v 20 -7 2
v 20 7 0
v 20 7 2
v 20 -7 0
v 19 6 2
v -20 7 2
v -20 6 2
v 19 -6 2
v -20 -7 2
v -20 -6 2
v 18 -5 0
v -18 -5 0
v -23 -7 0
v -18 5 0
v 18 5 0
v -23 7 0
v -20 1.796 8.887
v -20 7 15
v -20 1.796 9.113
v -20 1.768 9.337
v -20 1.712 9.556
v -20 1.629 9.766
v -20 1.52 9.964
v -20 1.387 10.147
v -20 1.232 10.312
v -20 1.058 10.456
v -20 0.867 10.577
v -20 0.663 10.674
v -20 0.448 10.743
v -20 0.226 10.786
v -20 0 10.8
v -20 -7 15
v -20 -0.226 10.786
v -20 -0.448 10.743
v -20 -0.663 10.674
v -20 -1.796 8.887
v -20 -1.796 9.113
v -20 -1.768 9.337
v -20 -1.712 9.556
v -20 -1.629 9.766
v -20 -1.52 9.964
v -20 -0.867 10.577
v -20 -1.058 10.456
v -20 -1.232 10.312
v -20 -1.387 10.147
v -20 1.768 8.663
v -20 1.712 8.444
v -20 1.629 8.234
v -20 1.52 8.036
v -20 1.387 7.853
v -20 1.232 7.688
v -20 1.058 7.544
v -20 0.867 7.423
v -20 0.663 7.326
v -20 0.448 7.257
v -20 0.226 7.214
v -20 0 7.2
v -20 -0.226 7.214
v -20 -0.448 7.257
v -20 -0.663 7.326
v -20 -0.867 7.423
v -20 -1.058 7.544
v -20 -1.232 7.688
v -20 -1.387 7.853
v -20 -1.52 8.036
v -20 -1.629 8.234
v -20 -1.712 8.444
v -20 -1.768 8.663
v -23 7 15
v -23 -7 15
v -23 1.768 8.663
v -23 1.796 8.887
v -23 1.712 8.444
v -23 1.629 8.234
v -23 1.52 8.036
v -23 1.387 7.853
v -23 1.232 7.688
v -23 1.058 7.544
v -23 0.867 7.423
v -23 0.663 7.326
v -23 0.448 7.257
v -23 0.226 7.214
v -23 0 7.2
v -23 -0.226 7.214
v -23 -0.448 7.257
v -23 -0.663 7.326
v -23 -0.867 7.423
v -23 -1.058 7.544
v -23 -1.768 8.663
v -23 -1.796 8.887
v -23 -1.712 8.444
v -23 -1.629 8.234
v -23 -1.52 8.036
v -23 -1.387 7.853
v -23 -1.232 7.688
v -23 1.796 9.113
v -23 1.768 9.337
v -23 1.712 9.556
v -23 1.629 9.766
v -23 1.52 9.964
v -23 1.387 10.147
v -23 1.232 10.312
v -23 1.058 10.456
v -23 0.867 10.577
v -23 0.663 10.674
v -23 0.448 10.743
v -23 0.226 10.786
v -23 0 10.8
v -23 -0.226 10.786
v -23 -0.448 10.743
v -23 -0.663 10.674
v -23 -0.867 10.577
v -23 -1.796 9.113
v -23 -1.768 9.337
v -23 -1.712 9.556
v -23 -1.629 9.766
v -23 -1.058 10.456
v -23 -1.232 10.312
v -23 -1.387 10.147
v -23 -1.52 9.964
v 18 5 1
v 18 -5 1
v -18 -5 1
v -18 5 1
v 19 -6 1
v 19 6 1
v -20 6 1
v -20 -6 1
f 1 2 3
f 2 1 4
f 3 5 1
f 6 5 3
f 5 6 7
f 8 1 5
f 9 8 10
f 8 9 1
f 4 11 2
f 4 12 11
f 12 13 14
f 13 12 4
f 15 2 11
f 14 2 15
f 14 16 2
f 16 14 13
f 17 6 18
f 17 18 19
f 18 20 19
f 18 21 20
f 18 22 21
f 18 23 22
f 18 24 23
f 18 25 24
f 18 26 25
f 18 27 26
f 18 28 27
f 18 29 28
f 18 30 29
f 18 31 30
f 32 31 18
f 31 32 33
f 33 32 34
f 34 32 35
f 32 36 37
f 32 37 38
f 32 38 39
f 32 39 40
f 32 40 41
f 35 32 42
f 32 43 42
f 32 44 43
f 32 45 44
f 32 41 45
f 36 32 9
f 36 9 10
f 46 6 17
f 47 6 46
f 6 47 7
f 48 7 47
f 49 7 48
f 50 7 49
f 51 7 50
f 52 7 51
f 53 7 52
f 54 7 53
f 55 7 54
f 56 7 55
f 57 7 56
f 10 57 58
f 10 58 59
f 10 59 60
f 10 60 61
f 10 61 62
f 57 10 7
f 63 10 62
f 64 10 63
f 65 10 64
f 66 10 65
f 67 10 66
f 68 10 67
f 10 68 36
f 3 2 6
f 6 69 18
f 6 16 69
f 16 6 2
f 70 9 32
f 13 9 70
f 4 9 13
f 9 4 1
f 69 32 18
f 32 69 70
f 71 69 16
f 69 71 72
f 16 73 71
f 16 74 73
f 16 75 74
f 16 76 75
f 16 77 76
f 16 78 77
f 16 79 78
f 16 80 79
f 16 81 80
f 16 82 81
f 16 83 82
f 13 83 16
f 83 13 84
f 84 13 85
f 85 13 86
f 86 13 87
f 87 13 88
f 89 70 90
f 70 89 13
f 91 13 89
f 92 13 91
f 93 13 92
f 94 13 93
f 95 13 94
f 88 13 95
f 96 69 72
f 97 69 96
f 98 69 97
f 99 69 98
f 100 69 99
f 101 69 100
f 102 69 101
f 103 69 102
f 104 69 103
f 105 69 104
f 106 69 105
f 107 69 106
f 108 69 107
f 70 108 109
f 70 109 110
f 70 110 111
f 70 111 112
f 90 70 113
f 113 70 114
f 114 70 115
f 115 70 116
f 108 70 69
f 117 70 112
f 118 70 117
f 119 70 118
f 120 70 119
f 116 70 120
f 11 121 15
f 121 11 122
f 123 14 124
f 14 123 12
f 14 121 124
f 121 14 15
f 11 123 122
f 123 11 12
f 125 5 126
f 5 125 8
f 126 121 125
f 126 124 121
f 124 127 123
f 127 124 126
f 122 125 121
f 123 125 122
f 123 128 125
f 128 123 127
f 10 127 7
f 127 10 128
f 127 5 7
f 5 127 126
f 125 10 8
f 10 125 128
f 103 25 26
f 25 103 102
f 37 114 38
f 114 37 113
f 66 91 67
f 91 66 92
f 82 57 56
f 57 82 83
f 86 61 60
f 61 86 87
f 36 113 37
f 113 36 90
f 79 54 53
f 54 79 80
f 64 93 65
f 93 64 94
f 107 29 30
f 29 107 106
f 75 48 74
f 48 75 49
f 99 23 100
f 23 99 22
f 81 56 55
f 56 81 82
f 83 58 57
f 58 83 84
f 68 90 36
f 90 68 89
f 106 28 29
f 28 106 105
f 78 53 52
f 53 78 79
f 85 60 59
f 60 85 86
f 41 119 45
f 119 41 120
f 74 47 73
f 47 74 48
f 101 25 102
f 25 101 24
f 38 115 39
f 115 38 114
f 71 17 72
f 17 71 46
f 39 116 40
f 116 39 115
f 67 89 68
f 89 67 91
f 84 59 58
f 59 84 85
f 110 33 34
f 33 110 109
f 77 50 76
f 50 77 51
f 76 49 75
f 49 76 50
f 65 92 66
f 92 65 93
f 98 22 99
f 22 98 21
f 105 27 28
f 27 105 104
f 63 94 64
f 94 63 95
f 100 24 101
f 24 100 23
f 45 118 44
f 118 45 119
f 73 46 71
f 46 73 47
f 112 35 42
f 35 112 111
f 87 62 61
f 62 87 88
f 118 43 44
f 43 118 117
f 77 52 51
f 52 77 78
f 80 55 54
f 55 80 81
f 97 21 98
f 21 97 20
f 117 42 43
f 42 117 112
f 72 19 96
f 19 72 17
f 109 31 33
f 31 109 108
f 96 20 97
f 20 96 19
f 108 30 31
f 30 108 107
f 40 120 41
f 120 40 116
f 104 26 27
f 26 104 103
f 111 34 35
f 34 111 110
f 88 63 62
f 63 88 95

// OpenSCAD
$fn = 50;


difference() {
	union() {
		translate(v = [-20.0000000000, -7.0000000000, 0]) {
			cube(size = [40, 14, 2]);
		}
		translate(v = [-23.0000000000, -7.0000000000, 0]) {
			cube(size = [3, 14, 15]);
		}
	}
	union() {
		translate(v = [-18.0000000000, -5.0000000000, 0]) {
			cube(size = [36, 10, 2]);
		}
		translate(v = [-20.0000000000, -6.0000000000, 1]) {
			cube(size = [39, 12, 1]);
		}
		#translate(v = [-30.0000000000, 0, 9]) {
			rotate(a = [0, 90, 0]) {
				cylinder(h = 20, r = 1.8000000000);
			}
		}
	}
}
